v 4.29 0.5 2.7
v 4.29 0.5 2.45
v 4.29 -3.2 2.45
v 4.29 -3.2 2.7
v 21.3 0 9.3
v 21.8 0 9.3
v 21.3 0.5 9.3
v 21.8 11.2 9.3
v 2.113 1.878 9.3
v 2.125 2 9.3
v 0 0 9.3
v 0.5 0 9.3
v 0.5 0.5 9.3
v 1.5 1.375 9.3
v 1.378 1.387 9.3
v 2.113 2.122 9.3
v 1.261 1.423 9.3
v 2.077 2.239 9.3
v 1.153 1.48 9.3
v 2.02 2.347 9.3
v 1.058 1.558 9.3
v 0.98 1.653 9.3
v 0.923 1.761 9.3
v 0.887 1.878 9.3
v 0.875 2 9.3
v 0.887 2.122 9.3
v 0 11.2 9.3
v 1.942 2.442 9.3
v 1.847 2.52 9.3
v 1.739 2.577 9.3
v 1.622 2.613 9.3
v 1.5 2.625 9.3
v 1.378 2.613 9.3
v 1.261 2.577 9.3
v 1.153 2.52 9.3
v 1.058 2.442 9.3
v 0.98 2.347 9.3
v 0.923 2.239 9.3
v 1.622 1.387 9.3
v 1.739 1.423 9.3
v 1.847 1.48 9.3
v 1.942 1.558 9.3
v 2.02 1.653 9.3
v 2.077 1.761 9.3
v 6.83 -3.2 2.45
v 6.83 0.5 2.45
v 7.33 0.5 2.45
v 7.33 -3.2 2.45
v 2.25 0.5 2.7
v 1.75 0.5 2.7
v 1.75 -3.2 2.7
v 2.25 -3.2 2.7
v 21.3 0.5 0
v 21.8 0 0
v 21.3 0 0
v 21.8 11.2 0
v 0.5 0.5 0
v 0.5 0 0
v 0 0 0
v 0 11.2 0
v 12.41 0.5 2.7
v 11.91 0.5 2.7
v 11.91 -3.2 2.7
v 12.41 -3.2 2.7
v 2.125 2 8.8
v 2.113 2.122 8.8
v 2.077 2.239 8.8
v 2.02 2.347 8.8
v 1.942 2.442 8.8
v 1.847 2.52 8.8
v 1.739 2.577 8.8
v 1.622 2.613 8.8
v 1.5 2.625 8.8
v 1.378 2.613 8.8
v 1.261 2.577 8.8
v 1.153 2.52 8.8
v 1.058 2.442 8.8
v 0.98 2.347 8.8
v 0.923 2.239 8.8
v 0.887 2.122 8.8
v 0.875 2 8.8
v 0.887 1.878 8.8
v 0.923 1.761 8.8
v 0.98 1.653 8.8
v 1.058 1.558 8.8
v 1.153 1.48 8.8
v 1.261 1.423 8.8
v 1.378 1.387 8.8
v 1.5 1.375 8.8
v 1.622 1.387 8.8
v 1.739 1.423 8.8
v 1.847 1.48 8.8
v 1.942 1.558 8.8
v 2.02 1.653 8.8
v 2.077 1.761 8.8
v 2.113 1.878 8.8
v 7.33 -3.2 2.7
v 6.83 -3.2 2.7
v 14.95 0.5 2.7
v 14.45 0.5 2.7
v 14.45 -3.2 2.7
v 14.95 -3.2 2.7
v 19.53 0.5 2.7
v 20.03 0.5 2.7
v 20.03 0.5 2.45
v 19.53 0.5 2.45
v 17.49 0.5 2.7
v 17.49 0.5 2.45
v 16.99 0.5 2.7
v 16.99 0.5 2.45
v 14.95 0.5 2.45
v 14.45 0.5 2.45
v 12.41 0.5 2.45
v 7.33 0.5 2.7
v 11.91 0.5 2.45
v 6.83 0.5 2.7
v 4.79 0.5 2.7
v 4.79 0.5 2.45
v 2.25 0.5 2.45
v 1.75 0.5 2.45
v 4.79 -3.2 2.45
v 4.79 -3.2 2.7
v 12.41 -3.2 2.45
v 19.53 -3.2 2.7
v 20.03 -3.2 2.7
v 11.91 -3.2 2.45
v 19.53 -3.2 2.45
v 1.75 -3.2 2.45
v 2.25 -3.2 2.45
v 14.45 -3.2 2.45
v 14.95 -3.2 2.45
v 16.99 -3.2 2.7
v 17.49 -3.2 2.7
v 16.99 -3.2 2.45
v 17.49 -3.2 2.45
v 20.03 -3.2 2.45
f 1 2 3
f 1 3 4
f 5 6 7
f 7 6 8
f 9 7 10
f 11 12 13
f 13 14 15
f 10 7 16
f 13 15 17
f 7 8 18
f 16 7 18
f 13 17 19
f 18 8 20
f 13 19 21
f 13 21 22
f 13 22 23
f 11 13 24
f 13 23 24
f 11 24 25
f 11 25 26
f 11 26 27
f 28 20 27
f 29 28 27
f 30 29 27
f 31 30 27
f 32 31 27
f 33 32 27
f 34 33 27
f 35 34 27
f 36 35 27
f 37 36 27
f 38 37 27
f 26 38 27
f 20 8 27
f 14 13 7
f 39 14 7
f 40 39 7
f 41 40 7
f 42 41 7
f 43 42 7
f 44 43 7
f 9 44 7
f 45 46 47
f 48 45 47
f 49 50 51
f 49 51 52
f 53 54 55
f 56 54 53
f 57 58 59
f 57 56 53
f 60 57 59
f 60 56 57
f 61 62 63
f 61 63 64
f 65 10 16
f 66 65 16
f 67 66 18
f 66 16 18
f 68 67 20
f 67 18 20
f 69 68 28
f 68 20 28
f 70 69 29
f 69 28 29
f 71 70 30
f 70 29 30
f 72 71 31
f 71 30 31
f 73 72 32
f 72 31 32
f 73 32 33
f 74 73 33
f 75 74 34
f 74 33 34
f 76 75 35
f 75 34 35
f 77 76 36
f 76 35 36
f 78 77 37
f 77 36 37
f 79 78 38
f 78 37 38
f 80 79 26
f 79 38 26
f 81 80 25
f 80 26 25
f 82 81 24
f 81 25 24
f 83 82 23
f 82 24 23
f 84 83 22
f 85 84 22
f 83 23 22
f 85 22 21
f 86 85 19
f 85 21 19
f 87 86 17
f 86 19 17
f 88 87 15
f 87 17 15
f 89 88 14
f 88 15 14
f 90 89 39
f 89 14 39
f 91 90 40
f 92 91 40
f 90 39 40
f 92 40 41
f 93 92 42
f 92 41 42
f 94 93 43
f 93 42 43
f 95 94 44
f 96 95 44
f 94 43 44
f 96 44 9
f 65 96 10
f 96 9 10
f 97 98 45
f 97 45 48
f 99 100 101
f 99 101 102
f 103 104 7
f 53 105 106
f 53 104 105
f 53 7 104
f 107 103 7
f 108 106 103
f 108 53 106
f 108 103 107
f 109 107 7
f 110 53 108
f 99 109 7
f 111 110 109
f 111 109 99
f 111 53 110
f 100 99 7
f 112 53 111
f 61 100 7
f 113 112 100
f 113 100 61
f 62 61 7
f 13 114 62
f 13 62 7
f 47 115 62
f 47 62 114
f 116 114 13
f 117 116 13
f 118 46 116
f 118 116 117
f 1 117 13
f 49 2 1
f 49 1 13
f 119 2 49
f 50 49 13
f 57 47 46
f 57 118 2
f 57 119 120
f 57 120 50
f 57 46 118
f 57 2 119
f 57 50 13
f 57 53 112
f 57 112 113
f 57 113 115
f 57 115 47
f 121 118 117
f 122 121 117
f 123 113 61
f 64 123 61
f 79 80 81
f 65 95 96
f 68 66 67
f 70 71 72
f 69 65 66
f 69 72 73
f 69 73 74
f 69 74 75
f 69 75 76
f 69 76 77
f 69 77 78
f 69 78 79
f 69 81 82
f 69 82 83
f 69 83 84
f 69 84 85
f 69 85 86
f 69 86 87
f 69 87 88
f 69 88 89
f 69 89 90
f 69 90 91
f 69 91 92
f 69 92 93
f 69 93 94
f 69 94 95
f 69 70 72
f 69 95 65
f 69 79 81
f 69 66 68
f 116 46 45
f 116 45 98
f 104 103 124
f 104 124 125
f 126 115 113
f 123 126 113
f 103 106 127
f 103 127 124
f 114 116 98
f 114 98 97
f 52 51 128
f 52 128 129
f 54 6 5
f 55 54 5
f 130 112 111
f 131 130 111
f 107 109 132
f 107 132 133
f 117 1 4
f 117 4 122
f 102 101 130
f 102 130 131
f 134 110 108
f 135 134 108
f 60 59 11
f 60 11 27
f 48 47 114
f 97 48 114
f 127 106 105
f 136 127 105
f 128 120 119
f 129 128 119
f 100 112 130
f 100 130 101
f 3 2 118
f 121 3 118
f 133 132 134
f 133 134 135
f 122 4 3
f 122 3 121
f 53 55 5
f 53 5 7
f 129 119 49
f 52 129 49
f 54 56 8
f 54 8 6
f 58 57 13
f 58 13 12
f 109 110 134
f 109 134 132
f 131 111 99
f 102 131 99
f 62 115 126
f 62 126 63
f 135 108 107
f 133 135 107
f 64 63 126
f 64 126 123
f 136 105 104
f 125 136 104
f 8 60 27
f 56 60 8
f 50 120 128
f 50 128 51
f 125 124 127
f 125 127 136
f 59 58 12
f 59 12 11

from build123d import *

# Parameters (mm, degrees)
BOSS_EXTRUDE1_DEPTH = 9.3
SKETCH3_W           = 0.5
SKETCH3_H           = 0.25
BOSS_EXTRUDE2_DEPTH = 3.7
SKETCH4_R           = 0.625
CUT_EXTRUDE1_DEPTH  = 0.5


with BuildPart() as part:
    # Sketch2 → Boss-Extrude1 (new body)
    with BuildSketch(Plane.XY):
        Polygon((0, 0), (0, 11.2), (21.8, 11.2), (21.8, 0), (21.3, 0), (21.3, 0.5), (0.5, 0.5), (0.5, 0), align=None)
    extrude(amount=BOSS_EXTRUDE1_DEPTH)

    # Sketch3 → Boss-Extrude2 (add)
    with BuildSketch(Plane.XZ.offset(-0.5)):
        with Locations((2, 2.575)):
            Rectangle(SKETCH3_W, SKETCH3_H)
        with Locations((4.54, 2.575)):
            Rectangle(SKETCH3_W, SKETCH3_H)
        with Locations((7.08, 2.575)):
            Rectangle(SKETCH3_W, SKETCH3_H)
        with Locations((12.16, 2.575)):
            Rectangle(SKETCH3_W, SKETCH3_H)
        with Locations((14.7, 2.575)):
            Rectangle(SKETCH3_W, SKETCH3_H)
        with Locations((17.24, 2.575)):
            Rectangle(SKETCH3_W, SKETCH3_H)
        with Locations((19.78, 2.575)):
            Rectangle(SKETCH3_W, SKETCH3_H)
    extrude(amount=BOSS_EXTRUDE2_DEPTH)

    # Sketch4 → Cut-Extrude1 (cut)
    with BuildSketch(Plane.XY.offset(9.3)):
        with Locations((1.5, 2)):
            Circle(SKETCH4_R)
    extrude(amount=-CUT_EXTRUDE1_DEPTH, mode=Mode.SUBTRACT)


solid = part.part
